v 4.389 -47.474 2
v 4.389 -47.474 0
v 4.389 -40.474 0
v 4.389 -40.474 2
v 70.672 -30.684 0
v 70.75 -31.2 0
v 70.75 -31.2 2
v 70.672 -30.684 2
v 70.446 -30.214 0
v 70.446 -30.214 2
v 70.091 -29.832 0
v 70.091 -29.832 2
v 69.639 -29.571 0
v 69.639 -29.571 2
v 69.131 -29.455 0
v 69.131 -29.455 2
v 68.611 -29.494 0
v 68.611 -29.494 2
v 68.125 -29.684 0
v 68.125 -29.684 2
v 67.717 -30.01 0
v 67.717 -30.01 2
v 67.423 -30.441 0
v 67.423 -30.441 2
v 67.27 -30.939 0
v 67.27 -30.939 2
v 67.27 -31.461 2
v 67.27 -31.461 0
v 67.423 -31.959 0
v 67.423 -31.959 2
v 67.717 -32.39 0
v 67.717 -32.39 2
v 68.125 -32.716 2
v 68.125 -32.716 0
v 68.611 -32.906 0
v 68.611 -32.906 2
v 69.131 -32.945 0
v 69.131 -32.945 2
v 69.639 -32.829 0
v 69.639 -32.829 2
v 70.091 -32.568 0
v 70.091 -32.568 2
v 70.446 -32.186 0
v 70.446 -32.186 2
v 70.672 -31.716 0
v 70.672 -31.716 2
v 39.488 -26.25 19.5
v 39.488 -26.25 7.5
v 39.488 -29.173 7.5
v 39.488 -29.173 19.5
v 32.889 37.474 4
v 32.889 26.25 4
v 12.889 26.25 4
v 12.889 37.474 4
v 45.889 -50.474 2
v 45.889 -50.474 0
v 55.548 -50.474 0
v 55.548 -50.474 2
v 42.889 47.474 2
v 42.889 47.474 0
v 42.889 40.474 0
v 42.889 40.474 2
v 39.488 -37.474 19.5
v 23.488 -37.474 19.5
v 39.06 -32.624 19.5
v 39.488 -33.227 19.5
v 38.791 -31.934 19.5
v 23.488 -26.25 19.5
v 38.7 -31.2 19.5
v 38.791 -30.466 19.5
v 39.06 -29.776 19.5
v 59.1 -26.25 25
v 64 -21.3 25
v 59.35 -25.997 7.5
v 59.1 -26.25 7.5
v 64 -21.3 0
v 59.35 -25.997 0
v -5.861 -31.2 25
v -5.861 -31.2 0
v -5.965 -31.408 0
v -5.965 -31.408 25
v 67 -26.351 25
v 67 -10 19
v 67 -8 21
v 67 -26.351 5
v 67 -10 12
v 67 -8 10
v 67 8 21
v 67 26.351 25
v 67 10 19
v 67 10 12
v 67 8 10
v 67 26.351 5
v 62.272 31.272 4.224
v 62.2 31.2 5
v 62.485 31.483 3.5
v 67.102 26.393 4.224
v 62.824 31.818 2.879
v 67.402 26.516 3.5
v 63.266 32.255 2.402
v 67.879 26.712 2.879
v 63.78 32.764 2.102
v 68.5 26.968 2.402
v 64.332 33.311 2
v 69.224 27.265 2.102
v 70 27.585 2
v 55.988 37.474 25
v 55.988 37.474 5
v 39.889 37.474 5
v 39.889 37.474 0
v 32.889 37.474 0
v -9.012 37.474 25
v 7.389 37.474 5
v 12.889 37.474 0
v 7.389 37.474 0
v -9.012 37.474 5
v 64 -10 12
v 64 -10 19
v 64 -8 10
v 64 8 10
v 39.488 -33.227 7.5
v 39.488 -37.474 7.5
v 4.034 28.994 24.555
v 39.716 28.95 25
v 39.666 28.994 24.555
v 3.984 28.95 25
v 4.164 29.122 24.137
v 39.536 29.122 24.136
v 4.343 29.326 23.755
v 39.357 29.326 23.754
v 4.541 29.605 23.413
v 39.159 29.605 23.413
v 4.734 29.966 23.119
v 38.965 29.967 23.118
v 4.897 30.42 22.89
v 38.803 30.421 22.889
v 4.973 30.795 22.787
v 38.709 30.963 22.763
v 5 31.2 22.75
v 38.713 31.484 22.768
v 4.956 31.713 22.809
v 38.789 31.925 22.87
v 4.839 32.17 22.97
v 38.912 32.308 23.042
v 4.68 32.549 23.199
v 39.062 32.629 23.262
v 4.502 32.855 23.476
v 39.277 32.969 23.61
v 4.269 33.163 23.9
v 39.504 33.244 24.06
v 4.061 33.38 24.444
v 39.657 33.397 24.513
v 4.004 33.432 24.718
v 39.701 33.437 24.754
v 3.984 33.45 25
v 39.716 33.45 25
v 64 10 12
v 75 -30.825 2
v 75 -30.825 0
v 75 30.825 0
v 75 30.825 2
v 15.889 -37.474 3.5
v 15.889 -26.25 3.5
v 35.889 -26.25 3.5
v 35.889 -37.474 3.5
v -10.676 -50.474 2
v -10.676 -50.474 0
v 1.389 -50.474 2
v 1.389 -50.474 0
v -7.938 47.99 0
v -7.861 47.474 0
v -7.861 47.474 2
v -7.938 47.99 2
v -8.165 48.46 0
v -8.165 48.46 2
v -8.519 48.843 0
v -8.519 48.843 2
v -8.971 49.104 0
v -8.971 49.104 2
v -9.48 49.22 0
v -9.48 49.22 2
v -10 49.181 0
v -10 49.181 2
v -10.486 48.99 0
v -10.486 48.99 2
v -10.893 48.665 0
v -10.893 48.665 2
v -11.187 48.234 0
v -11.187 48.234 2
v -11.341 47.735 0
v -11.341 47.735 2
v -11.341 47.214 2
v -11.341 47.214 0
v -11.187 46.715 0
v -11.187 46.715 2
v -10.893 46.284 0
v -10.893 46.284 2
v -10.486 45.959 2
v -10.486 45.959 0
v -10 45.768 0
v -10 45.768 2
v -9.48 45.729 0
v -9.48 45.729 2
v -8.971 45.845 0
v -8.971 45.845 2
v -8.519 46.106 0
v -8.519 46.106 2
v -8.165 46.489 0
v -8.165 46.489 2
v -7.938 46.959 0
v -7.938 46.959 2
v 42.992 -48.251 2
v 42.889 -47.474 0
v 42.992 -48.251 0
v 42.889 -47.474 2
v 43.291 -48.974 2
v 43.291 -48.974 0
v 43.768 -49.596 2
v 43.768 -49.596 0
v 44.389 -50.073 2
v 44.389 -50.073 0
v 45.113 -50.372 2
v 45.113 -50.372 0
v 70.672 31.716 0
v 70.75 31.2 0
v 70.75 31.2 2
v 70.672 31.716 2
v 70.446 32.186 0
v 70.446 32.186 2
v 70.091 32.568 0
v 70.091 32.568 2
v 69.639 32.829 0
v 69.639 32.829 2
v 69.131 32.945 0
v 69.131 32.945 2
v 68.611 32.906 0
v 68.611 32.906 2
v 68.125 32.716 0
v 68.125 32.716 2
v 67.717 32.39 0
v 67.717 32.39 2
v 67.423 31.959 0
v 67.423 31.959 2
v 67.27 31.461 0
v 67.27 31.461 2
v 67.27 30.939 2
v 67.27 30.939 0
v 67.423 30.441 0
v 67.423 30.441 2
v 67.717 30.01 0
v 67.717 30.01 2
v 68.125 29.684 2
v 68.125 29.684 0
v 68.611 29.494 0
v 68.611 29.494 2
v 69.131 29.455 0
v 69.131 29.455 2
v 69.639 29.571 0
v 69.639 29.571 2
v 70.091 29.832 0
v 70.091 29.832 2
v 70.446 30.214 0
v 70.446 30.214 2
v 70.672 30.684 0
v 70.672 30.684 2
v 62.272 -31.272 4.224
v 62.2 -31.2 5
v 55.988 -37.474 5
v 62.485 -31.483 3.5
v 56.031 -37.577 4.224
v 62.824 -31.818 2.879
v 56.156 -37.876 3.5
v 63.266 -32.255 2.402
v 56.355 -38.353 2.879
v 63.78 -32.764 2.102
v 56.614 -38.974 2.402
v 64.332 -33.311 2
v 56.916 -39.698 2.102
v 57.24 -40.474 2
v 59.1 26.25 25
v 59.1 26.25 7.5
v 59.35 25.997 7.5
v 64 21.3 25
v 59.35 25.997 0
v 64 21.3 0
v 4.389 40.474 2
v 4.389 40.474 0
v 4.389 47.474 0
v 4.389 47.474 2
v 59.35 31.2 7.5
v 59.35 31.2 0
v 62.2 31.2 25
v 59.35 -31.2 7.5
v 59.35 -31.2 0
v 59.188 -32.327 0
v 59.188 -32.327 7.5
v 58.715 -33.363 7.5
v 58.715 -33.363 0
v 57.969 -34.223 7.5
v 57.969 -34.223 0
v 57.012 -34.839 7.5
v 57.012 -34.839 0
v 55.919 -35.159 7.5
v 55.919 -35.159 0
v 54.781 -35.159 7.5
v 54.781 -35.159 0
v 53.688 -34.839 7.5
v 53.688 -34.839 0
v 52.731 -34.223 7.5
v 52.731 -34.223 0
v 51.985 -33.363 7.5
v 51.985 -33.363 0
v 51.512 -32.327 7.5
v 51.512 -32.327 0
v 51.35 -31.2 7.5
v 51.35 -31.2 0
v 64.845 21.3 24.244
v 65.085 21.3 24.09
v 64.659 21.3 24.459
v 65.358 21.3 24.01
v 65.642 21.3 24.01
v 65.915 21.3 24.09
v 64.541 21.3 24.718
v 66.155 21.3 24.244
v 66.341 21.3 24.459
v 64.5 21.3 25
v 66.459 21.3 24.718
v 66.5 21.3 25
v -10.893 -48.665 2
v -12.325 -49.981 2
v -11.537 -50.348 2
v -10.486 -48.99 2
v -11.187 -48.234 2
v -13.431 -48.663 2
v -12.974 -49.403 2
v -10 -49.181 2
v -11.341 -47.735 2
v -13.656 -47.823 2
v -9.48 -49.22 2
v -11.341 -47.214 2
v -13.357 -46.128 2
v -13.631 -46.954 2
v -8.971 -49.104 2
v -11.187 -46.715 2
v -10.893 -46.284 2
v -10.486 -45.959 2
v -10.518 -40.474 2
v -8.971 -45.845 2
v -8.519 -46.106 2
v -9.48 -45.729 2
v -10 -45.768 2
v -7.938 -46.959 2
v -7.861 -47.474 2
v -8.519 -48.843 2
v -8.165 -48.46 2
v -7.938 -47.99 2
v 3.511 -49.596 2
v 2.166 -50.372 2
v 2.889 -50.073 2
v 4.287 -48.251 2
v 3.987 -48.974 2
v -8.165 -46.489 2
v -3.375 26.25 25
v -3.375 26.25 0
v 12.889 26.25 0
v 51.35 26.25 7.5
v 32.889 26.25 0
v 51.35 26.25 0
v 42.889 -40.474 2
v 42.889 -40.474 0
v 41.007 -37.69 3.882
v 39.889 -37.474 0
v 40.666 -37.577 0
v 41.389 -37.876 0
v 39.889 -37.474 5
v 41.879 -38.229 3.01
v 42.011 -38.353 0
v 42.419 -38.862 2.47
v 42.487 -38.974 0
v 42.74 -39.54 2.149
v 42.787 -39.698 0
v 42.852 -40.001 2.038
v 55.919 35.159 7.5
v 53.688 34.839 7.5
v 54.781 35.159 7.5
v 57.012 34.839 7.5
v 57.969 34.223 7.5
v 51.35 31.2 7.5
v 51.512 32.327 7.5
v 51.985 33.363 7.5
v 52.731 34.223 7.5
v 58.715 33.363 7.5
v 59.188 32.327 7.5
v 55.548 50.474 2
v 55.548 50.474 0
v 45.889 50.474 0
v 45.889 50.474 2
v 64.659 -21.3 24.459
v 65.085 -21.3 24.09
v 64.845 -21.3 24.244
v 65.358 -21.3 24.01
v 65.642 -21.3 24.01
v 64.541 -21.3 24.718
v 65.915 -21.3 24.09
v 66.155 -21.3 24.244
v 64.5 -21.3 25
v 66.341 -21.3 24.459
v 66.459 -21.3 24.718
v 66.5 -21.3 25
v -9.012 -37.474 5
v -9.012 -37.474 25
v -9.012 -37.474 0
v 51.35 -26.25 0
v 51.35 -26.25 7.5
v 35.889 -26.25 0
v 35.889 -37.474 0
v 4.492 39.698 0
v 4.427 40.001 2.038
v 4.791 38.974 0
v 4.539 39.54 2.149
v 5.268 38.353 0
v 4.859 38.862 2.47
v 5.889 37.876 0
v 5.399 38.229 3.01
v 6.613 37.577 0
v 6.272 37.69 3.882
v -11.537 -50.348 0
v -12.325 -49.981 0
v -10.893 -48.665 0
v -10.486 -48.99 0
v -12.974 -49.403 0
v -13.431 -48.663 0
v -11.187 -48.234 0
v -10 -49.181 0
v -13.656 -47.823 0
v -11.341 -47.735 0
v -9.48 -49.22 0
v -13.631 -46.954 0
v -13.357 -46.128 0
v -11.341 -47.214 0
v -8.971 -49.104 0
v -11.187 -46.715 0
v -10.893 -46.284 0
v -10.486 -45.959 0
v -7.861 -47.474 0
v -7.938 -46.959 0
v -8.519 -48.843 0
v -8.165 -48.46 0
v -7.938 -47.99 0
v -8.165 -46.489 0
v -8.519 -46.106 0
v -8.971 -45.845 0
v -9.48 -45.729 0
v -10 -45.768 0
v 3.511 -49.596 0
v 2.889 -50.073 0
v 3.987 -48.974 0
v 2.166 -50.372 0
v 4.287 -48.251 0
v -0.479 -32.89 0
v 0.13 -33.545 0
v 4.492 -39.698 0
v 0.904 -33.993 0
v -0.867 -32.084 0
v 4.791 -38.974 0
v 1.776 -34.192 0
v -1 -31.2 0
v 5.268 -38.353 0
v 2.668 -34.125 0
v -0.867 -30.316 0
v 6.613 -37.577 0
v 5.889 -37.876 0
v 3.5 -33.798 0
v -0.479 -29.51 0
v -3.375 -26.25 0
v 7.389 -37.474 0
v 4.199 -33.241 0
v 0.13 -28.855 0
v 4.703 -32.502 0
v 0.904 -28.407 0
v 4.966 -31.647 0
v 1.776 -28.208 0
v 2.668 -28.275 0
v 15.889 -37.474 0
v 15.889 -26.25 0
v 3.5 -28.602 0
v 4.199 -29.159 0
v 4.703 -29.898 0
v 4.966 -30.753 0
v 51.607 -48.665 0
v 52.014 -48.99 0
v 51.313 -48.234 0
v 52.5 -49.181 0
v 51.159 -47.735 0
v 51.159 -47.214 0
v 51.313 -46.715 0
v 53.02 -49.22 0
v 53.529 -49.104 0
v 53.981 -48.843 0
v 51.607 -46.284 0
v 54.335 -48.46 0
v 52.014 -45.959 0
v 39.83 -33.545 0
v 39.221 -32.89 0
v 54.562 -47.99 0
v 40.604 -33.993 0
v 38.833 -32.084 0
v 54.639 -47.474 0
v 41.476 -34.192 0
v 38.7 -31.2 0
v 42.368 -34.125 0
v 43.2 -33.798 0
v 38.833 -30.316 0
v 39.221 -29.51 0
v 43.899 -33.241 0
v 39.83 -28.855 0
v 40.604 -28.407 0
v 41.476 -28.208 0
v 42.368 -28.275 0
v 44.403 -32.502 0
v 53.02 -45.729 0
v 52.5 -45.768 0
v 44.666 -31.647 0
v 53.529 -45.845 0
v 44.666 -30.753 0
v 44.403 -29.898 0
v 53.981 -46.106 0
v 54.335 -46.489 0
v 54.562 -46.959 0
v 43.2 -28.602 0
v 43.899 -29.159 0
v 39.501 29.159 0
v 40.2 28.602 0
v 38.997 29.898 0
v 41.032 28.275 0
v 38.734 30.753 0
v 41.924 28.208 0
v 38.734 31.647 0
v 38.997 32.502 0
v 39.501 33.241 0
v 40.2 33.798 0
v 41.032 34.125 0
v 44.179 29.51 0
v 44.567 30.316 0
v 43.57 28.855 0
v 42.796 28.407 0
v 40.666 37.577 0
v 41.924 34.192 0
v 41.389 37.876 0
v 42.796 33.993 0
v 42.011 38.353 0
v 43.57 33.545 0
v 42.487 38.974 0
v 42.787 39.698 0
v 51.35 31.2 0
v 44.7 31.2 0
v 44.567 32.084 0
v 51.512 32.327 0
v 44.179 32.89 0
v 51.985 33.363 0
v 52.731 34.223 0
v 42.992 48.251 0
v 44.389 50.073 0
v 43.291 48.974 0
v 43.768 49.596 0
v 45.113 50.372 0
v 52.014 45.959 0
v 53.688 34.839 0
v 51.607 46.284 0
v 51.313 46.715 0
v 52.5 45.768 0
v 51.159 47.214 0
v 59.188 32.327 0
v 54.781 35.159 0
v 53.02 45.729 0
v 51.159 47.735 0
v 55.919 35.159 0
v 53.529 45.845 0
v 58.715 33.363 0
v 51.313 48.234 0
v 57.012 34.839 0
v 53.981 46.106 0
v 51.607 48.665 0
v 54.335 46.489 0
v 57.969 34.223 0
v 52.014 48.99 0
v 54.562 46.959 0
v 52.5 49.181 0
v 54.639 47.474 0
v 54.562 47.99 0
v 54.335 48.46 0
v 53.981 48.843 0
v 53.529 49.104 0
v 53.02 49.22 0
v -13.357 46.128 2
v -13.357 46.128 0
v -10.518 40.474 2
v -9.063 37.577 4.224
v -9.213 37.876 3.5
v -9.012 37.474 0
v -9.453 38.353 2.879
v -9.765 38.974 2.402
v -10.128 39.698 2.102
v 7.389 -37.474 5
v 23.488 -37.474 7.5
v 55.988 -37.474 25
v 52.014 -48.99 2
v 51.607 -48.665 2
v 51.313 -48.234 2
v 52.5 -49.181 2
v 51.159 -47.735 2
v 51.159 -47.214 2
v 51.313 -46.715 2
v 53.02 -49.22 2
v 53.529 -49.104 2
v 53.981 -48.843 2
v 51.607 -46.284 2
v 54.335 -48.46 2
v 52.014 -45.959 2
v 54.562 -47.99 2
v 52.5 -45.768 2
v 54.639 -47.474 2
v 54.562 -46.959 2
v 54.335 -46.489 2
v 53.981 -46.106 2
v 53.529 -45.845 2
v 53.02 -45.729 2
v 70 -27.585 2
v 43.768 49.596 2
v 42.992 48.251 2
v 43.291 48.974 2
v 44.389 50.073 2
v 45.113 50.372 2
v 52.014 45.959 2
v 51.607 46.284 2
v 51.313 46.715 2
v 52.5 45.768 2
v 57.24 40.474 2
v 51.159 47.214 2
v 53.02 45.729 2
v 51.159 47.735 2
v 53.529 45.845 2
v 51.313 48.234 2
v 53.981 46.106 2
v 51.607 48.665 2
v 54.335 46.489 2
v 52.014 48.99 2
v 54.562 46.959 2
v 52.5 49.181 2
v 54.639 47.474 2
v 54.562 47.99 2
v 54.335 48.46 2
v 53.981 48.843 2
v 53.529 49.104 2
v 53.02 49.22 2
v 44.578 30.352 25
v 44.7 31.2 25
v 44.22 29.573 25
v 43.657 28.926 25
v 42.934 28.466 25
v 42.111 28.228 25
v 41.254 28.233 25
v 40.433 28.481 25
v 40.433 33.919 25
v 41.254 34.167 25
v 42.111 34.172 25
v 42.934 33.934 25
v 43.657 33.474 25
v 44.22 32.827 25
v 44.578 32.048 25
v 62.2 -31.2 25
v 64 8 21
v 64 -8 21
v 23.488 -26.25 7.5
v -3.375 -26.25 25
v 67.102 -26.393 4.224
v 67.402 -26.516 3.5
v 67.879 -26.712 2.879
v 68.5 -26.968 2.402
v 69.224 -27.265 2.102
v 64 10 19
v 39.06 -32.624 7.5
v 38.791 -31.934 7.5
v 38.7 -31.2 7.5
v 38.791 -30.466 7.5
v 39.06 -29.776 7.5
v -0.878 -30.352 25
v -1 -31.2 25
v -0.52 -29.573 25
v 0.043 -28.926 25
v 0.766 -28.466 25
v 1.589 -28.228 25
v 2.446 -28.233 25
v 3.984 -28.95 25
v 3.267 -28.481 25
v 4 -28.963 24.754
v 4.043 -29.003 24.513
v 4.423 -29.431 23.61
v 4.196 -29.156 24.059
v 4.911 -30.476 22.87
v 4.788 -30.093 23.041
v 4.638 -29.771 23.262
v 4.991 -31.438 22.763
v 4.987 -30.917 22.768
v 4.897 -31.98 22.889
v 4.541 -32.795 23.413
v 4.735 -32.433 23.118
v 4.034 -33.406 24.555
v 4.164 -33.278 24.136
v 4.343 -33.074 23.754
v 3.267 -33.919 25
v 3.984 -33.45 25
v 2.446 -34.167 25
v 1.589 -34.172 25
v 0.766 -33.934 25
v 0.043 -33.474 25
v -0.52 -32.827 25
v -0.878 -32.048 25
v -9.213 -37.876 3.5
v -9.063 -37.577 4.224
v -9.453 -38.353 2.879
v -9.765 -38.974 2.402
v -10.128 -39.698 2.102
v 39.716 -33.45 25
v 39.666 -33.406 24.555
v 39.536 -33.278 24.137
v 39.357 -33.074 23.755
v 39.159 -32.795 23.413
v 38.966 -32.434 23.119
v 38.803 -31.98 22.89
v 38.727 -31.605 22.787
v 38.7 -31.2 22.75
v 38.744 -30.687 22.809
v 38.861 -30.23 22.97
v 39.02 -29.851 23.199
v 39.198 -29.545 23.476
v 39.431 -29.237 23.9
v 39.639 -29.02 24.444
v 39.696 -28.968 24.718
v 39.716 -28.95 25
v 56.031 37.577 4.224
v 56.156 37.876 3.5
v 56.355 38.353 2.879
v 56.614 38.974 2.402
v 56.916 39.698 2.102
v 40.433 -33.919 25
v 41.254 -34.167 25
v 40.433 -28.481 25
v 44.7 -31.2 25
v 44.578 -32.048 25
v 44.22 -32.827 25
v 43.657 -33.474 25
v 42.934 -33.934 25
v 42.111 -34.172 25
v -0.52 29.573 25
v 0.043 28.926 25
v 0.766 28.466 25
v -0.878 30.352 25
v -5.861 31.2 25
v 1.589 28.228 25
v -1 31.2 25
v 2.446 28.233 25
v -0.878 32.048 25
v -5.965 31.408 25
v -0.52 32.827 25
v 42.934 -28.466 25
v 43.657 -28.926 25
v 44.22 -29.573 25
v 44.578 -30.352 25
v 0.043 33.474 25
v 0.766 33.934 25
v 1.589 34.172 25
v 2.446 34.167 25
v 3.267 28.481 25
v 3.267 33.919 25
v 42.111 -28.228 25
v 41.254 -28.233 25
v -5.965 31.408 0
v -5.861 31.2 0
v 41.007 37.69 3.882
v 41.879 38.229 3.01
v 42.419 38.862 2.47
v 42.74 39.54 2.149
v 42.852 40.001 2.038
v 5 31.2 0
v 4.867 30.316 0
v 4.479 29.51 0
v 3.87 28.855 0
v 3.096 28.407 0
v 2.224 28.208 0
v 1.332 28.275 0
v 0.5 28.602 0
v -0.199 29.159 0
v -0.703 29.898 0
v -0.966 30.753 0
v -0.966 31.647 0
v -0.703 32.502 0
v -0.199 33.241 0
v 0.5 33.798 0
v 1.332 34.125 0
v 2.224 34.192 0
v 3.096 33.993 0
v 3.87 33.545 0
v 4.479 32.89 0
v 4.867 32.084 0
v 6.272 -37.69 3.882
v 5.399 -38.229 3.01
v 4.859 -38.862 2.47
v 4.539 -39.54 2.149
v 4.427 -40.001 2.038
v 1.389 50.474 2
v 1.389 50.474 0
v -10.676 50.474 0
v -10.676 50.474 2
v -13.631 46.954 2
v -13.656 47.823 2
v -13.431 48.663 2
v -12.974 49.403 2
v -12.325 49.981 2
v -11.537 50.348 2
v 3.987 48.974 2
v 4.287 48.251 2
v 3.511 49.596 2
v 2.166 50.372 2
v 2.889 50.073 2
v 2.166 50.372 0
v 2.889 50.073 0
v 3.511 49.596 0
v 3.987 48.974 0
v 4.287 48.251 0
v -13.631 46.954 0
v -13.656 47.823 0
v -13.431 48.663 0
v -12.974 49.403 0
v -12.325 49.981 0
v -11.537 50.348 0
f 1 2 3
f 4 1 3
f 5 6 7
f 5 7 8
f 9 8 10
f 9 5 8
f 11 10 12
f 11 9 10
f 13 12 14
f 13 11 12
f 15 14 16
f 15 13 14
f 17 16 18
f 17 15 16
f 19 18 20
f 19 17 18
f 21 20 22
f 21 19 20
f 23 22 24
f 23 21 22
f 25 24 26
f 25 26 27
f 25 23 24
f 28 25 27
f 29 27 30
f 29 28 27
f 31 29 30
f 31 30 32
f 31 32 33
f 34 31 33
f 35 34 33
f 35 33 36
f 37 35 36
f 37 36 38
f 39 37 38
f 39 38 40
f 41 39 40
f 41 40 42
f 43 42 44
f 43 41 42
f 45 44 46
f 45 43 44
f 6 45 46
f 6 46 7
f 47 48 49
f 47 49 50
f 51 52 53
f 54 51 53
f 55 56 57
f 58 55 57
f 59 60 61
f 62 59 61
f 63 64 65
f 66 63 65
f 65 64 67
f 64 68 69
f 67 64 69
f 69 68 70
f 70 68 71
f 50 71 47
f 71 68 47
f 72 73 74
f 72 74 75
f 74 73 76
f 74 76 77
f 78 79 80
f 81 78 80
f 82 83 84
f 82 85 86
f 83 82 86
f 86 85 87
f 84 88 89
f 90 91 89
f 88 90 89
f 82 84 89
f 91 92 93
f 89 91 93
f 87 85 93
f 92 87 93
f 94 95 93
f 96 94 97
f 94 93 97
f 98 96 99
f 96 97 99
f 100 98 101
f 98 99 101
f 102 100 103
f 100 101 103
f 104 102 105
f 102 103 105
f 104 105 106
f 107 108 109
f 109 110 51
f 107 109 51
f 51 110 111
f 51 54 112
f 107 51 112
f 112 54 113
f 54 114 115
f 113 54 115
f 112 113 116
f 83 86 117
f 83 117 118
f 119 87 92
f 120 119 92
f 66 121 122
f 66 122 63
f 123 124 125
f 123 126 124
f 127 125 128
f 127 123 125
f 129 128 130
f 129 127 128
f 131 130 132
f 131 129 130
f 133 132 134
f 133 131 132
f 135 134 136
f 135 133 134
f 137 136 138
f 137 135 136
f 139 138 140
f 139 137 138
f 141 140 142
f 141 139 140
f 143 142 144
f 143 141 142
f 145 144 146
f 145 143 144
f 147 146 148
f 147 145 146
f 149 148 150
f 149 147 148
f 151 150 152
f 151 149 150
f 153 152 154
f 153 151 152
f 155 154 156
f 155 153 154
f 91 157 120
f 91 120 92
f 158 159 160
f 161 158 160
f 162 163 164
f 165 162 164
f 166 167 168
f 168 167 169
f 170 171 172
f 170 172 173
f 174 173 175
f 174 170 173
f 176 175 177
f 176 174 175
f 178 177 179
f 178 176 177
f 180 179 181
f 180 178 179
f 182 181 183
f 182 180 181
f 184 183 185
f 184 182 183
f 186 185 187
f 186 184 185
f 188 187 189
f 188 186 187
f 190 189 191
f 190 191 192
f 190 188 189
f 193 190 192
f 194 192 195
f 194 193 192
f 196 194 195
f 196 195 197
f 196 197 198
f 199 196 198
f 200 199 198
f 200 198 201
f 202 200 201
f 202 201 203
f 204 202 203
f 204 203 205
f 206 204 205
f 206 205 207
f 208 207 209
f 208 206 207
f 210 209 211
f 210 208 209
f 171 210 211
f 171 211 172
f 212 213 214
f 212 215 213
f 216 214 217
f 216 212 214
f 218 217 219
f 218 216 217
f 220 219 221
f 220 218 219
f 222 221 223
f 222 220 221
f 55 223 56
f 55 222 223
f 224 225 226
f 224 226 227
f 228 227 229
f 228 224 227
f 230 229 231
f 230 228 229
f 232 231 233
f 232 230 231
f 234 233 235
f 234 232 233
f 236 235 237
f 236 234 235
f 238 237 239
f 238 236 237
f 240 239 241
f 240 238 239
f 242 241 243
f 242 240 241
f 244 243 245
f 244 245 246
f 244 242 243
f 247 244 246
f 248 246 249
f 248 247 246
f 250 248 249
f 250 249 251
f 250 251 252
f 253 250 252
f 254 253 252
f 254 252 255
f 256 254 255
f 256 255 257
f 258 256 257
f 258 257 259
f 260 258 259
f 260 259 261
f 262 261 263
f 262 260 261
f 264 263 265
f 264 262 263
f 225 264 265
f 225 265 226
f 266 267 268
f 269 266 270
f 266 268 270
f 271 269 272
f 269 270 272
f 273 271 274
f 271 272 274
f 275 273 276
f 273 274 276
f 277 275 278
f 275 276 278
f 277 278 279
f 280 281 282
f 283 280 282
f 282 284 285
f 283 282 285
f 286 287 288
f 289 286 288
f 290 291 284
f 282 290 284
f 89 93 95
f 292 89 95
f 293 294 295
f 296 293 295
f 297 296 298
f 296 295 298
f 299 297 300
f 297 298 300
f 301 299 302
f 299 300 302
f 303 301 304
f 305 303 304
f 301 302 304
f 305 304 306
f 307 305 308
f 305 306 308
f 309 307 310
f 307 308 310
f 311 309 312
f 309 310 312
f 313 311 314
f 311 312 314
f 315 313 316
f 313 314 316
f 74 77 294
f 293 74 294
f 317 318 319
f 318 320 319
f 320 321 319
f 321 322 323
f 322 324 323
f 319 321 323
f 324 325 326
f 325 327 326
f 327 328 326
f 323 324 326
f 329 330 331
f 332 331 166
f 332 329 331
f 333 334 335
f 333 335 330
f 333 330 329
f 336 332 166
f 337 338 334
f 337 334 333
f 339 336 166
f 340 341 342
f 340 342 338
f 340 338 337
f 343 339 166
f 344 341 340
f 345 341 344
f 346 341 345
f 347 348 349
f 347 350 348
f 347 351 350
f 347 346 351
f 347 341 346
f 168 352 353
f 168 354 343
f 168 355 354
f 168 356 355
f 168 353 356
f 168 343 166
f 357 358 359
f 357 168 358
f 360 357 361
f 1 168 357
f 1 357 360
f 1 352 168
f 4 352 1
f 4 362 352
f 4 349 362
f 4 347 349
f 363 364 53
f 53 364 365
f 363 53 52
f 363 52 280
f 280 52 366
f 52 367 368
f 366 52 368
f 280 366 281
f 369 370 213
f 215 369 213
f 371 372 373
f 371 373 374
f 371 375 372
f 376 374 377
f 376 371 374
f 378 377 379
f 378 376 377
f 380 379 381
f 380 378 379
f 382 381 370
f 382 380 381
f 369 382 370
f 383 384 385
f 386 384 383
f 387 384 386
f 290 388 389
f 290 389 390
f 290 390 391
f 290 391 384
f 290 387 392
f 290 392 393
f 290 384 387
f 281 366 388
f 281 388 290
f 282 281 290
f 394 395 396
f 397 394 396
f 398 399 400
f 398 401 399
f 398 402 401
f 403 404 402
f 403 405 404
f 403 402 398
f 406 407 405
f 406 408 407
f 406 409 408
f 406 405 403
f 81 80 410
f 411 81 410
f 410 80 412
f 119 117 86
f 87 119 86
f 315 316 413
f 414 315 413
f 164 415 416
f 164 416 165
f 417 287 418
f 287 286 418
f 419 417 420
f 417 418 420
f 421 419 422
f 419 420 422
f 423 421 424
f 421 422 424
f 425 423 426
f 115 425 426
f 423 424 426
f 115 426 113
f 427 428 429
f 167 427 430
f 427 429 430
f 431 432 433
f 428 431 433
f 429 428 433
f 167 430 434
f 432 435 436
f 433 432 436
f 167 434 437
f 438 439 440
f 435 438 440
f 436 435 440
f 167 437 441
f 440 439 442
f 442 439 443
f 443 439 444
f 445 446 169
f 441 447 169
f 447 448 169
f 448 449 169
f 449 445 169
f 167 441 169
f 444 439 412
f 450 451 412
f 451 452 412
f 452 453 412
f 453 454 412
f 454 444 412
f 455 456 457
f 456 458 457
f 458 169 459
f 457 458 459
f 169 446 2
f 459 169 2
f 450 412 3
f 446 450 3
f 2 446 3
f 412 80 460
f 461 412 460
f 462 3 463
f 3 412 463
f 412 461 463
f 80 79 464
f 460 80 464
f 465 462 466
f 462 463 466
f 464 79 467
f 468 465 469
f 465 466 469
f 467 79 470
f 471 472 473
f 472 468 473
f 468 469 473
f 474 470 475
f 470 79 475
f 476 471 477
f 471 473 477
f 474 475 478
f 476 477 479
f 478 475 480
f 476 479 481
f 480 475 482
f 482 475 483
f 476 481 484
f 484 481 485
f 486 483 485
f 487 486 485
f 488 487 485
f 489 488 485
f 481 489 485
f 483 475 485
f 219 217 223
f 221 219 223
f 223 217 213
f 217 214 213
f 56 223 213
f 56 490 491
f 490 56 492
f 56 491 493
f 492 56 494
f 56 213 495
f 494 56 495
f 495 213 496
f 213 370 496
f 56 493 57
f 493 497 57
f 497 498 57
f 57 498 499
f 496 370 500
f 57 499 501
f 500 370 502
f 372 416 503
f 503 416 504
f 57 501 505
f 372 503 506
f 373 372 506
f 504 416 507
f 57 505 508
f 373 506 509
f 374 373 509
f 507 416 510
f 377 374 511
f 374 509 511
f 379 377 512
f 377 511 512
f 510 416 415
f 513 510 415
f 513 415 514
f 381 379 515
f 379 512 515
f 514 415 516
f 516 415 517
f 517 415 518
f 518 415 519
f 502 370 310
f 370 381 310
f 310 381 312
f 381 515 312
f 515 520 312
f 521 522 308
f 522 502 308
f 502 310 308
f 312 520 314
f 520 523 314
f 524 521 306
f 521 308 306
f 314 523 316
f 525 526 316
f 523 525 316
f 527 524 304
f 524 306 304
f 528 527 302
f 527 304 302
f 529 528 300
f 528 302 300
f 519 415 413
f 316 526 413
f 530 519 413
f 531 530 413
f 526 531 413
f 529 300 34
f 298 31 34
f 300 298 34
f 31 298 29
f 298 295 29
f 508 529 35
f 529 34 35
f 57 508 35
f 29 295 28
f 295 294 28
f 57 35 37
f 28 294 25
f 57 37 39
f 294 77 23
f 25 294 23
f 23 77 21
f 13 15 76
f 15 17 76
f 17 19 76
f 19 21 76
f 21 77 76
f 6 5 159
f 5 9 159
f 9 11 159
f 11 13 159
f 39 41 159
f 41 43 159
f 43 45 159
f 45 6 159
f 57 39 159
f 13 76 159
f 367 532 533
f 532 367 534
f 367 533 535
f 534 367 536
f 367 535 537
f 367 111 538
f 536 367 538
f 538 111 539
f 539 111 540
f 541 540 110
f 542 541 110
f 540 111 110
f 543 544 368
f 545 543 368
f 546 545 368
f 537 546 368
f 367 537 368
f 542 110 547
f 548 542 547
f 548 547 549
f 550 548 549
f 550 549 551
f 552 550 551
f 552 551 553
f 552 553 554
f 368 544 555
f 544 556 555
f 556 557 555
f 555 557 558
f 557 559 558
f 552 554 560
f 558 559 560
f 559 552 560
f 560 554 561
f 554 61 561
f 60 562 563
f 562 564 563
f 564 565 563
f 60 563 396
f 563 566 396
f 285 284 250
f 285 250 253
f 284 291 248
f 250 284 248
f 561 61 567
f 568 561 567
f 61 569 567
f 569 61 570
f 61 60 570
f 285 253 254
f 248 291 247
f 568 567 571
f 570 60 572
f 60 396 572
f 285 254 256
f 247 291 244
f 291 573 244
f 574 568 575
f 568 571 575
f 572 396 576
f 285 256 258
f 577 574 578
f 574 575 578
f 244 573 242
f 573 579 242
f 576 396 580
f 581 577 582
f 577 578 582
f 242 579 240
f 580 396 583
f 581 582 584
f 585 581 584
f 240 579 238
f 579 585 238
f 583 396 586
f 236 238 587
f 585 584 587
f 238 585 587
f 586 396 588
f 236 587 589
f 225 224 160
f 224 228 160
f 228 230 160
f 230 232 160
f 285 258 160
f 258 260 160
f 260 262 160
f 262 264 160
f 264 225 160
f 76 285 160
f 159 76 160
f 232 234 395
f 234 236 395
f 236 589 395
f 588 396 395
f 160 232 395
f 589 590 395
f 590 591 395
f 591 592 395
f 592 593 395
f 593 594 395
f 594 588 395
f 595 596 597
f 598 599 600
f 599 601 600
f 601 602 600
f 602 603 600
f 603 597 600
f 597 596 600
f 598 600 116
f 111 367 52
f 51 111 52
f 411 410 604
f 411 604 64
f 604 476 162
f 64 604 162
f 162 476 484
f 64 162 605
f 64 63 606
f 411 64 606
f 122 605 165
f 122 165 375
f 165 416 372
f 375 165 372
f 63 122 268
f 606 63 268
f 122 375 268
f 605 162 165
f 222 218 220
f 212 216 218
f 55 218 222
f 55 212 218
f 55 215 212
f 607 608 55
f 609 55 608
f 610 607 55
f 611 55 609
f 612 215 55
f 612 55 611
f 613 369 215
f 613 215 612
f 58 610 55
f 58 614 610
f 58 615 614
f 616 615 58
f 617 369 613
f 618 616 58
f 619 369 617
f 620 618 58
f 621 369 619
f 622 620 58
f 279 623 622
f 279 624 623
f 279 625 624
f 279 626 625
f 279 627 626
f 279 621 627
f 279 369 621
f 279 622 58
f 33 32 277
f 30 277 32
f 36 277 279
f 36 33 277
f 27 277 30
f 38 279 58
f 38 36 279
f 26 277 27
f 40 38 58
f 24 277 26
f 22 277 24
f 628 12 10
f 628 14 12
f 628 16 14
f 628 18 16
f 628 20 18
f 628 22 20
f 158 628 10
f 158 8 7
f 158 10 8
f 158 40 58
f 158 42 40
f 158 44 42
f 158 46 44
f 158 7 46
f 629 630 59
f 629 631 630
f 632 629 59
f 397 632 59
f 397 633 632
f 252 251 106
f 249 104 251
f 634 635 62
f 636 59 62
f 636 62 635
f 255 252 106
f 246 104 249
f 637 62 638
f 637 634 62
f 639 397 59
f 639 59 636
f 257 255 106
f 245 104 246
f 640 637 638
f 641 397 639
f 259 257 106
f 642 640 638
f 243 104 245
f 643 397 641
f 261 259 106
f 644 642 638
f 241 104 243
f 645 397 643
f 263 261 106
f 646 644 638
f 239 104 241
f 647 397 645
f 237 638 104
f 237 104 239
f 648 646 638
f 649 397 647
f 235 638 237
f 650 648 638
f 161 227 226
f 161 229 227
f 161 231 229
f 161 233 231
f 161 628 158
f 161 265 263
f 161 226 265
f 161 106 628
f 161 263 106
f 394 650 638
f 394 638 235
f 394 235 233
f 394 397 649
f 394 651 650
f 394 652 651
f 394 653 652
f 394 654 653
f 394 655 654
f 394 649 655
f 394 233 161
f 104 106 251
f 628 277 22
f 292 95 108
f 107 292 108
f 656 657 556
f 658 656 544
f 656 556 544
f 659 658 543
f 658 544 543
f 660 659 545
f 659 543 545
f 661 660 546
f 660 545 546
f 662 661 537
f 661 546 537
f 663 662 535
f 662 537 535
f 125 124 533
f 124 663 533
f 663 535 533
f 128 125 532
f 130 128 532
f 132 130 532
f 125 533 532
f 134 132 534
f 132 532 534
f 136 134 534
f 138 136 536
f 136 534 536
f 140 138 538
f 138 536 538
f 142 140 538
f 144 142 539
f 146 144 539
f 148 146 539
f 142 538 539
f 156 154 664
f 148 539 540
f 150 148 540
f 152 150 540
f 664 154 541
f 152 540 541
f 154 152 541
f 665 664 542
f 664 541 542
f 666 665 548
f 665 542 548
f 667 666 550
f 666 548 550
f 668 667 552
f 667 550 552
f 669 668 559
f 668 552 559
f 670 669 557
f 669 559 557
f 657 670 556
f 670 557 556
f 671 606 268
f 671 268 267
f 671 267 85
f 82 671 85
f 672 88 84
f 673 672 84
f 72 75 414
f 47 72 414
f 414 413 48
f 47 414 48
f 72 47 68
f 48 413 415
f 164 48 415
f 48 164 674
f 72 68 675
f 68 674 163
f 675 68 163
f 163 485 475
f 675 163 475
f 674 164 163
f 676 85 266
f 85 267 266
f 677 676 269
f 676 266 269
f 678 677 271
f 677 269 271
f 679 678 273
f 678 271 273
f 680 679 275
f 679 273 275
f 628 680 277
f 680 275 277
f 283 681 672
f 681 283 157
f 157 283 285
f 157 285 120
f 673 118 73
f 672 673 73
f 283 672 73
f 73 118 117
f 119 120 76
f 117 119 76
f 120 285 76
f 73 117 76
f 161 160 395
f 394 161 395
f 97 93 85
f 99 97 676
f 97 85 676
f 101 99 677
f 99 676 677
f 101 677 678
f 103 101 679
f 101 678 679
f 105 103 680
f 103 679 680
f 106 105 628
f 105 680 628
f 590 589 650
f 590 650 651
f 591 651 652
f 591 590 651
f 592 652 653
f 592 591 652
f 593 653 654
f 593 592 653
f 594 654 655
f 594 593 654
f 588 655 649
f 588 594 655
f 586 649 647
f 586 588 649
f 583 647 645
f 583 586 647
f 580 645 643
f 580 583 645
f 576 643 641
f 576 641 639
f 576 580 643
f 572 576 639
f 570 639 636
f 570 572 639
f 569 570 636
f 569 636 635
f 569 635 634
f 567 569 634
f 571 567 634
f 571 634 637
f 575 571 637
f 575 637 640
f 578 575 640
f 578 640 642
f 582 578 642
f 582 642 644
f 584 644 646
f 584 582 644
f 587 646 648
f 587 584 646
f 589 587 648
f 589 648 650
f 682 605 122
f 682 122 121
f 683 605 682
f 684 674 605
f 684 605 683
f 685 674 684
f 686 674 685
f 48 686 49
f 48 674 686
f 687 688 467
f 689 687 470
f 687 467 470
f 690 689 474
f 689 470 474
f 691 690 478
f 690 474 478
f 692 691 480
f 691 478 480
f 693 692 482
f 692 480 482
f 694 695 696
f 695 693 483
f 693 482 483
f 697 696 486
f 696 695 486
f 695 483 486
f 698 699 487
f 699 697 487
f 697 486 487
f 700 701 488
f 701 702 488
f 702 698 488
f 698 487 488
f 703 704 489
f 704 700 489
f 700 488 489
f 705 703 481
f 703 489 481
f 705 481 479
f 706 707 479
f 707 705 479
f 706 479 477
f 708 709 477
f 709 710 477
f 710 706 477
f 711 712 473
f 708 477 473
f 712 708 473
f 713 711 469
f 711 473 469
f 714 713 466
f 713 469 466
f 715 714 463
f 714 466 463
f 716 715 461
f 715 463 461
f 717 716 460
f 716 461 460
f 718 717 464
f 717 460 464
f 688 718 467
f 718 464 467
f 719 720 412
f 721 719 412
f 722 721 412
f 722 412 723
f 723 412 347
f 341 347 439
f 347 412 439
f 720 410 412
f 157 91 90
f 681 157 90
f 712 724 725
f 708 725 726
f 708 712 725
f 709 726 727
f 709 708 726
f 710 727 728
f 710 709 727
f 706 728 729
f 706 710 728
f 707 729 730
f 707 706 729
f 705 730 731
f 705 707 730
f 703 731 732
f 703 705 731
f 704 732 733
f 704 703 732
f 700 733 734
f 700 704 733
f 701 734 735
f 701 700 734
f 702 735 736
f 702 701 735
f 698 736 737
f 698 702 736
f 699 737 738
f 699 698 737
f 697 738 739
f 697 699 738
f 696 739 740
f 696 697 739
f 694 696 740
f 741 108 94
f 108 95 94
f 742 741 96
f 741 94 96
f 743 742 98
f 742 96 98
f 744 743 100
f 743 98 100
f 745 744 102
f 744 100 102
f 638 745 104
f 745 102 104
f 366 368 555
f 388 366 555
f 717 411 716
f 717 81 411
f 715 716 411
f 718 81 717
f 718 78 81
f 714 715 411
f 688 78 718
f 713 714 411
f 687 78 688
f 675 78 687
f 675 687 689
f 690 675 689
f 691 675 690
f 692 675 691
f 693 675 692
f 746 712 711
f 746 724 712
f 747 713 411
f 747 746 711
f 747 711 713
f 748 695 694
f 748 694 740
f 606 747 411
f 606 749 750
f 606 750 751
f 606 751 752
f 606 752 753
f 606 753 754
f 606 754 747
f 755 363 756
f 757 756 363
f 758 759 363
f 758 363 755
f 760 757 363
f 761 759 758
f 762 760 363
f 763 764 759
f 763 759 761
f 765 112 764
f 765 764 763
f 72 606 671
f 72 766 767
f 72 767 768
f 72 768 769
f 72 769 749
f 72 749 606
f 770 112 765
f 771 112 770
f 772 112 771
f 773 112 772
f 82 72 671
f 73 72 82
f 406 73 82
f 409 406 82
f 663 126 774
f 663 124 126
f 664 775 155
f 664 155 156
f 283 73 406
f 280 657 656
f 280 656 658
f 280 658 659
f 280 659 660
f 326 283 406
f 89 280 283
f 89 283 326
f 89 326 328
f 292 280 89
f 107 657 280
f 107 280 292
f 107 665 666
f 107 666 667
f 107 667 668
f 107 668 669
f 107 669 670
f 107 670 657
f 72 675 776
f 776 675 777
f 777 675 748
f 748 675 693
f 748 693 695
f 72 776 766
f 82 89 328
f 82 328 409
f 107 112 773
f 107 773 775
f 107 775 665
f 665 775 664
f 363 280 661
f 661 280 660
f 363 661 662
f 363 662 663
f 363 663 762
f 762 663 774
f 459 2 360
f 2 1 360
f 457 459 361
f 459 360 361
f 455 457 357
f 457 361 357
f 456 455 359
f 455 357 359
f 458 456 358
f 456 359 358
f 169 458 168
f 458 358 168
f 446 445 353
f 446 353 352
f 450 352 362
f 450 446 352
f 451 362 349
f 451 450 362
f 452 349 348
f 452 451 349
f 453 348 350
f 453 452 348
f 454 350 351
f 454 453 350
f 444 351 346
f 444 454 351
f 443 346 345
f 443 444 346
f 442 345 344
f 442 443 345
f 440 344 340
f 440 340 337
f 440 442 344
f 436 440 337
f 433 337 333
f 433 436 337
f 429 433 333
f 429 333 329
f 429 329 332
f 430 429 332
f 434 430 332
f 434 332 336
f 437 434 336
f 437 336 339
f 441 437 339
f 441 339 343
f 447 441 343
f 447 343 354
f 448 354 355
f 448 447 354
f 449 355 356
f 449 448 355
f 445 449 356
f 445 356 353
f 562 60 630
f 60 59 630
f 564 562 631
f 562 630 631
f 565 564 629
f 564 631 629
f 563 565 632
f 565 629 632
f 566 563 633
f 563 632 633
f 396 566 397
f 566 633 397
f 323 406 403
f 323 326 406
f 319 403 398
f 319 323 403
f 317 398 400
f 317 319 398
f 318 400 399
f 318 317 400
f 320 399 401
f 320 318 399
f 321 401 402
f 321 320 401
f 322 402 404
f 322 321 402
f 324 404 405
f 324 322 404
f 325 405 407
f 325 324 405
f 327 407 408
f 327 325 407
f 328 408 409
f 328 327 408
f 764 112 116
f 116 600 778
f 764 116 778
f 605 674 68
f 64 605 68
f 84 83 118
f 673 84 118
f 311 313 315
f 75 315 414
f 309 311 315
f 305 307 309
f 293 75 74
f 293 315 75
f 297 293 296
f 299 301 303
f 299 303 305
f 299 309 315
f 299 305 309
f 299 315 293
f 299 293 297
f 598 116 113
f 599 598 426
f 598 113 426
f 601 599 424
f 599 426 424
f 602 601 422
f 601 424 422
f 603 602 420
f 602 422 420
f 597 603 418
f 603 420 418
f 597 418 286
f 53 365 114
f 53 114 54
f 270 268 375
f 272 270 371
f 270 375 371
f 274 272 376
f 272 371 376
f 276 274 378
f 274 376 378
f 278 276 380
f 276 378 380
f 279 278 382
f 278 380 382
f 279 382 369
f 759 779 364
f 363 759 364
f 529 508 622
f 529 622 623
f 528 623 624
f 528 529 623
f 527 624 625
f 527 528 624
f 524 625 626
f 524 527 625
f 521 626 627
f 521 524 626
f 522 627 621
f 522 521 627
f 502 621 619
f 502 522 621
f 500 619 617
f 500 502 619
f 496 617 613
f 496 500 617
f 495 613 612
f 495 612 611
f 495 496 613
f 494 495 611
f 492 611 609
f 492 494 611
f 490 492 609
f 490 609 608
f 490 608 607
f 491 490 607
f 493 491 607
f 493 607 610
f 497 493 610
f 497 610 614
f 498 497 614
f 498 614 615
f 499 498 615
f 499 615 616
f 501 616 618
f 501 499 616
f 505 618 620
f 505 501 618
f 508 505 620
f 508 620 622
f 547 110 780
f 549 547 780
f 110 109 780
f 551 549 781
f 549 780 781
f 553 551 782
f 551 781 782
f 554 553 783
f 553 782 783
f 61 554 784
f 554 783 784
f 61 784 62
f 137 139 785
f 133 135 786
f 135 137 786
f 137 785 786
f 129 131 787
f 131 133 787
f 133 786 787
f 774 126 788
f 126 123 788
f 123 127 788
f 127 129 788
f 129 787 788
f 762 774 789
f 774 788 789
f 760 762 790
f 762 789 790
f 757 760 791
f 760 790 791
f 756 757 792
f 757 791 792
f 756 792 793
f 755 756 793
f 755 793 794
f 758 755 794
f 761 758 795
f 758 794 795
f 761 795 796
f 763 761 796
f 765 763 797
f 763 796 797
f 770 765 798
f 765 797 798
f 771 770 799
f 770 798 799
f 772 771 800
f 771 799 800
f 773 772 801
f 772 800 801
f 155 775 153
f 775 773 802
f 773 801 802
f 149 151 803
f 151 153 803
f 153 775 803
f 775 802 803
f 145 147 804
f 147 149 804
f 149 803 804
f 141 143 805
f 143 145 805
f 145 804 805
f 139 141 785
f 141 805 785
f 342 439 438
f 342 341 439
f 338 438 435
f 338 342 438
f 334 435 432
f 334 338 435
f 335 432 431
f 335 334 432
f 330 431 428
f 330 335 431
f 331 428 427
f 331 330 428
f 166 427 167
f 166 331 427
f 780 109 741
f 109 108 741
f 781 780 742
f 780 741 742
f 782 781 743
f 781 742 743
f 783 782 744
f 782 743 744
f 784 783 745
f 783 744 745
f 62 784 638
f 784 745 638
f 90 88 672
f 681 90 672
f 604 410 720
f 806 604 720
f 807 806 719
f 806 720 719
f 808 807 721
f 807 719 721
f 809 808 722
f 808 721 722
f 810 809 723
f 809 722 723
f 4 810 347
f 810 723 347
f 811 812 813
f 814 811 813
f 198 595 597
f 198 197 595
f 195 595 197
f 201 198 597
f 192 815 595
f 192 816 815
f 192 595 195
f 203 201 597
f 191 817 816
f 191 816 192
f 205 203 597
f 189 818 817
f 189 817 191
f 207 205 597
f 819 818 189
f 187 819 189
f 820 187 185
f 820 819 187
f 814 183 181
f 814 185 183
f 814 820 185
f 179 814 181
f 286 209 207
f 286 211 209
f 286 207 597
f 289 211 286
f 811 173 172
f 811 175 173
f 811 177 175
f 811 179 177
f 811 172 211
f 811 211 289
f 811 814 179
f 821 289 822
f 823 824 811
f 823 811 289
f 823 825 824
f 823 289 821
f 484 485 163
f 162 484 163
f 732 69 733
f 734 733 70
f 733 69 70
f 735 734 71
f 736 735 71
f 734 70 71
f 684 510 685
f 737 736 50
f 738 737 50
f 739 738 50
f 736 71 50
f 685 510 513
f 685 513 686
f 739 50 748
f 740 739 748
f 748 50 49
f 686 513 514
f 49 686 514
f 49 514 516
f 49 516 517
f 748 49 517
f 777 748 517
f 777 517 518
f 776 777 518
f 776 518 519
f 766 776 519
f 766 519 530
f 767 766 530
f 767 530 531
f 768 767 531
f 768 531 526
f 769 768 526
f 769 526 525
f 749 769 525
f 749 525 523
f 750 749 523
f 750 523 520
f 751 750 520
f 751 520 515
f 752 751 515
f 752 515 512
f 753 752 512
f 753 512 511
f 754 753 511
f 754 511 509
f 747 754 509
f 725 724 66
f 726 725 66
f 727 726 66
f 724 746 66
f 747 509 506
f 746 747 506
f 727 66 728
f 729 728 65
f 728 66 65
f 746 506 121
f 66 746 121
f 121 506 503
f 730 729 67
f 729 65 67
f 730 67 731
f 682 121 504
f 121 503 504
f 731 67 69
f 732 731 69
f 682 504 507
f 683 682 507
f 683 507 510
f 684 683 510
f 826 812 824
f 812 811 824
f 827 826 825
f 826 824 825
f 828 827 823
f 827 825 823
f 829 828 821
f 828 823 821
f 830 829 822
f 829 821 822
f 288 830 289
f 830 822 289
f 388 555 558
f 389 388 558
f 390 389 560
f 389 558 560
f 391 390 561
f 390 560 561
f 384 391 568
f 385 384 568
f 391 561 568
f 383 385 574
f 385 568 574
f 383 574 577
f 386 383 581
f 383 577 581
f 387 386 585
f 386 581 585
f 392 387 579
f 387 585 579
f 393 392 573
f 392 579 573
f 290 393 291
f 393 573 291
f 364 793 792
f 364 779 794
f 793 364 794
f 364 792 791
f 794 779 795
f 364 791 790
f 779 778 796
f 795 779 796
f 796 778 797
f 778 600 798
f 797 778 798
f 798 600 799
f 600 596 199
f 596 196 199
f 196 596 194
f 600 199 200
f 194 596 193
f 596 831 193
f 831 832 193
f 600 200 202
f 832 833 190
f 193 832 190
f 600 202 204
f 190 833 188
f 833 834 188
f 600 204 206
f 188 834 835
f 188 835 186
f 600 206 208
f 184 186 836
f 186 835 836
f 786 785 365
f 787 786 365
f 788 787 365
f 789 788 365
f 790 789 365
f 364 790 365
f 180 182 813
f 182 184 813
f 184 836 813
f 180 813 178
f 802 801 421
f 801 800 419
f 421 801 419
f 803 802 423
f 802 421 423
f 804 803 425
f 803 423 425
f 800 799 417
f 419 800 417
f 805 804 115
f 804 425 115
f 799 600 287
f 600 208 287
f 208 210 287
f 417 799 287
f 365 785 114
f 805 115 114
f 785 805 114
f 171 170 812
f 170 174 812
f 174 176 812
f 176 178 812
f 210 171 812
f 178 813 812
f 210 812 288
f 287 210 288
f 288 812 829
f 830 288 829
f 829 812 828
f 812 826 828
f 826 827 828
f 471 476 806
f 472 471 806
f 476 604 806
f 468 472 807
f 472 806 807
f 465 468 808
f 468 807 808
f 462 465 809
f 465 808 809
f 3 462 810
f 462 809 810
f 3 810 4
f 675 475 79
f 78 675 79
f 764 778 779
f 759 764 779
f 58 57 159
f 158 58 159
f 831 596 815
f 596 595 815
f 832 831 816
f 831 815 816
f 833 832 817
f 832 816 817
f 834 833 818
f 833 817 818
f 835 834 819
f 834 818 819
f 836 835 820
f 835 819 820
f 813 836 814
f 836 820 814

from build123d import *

# Parameters (mm, degrees)
F0_R      = 1.75
F1_DEPTH  = 2
F2_DEPTH  = 25
F3_W      = 10
F3_H      = 11
F4_DEPTH  = 12.5
F5_W      = 16
F5_H      = 12
F5_W_2    = 9.587623179
F5_H_2    = 49.3407100439
F5_W_3    = 20
F5_H_3    = 3.5
F6_W      = 20
F6_H      = 4
F7_DEPTH  = 12.5
F8_R      = 3
F10_DEPTH = 7.5
F11_W     = 1
F11_H     = 42.6
F15_SIZE  = 2


# Not quite as in the source:
# - a feature names something its author has since deleted; it is built from what else it names


with BuildPart() as f1:
    # F0 (on Top) → F1 (new body)
    with BuildSketch(Plane.XY):
        Polygon((-15.5396774872, 50.4744988004), (-9.0115841546, 37.4744988004), (4.3894230769, 37.4744988004), (4.3894230769, 50.4744988004), align=None)
        with Locations((-9.6105769231, 47.4744988004)):
            Circle(F0_R, mode=Mode.SUBTRACT)
    extrude(amount=F1_DEPTH)



with BuildPart() as f1b:
    # F0 (on Top) → F1, piece 2 (new body)
    with BuildSketch(Plane.XY):
        Polygon((55.9884158454, 37.4744988004), (62.1997159179, 31.2), (67, 26.3508739936), (67, -26.3508739936), (62.1997159179, -31.2), (55.9884158454, -37.4744988004), (42.8894230769, -37.4744988004), (42.8894230769, -50.4744988004), (55.5480775622, -50.4744988004), (75, -30.8246569672), (75, 30.8246569672), (55.5480775622, 50.4744988004), (42.8894230769, 50.4744988004), (42.8894230769, 37.4744988004), align=None)
        with Locations((52.8894230769, -47.4744988004)):
            Circle(F0_R, mode=Mode.SUBTRACT)
        with Locations((69, -31.2)):
            Circle(F0_R, mode=Mode.SUBTRACT)
        with Locations((69, 31.2)):
            Circle(F0_R, mode=Mode.SUBTRACT)
        with Locations((52.8894230769, 47.4744988004)):
            Circle(F0_R, mode=Mode.SUBTRACT)
    extrude(amount=F1_DEPTH)


with BuildPart() as f1c:
    # F0 (on Top) → F1, piece 3 (new body)
    with BuildSketch(Plane.XY):
        Polygon((4.3894230769, -50.4744988004), (4.3894230769, -37.4744988004), (-9.0115841546, -37.4744988004), (-15.5396774872, -50.4744988004), align=None)
        with Locations((-9.6105769231, -47.4744988004)):
            Circle(F0_R, mode=Mode.SUBTRACT)
    extrude(amount=F1_DEPTH)


with BuildPart() as f1_1:
    add(f1.part)

    add(f1b.part)  # F2 merges F1b

    add(f1c.part)  # F2 merges F1c
    # F0 (on Top) → F2 (join)
    with BuildSketch(Plane.XY):
        with BuildLine():
            ThreePointArc((-1, 31.2), (2, 34.2), (5, 31.2))
            Line((5, 31.2), (38.7, 31.2))
            ThreePointArc((38.7, 31.2), (41.7, 34.2), (44.7, 31.2))
            Line((44.7, 31.2), (54.1997159179, 31.2))
            Line((54.1997159179, 31.2), (62.1997159179, 31.2))
            Line((62.1997159179, 31.2), (55.9884158454, 37.4744988004))
            Line((55.9884158454, 37.4744988004), (42.8894230769, 37.4744988004))
            Line((42.8894230769, 37.4744988004), (4.3894230769, 37.4744988004))
            Line((4.3894230769, 37.4744988004), (-9.0115841546, 37.4744988004))
            Line((-9.0115841546, 37.4744988004), (-5.9652768733, 31.4081035087))
            Line((-5.9652768733, 31.4081035087), (-5.8607754019, 31.2))
            Line((-5.8607754019, 31.2), (-1, 31.2))
        make_face()
        with BuildLine():
            Line((55.9884158454, -37.4744988004), (62.1997159179, -31.2))
            Line((62.1997159179, -31.2), (54.1997159179, -31.2))
            Line((54.1997159179, -31.2), (44.7, -31.2))
            ThreePointArc((44.7, -31.2), (41.7, -34.2), (38.7, -31.2))
            Line((38.7, -31.2), (5, -31.2))
            ThreePointArc((5, -31.2), (2, -34.2), (-1, -31.2))
            Line((-1, -31.2), (-5.8607754019, -31.2))
            Line((-5.8607754019, -31.2), (-5.9652768733, -31.4081035087))
            Line((-5.9652768733, -31.4081035087), (-9.0115841546, -37.4744988004))
            Line((-9.0115841546, -37.4744988004), (4.3894230769, -37.4744988004))
            Line((4.3894230769, -37.4744988004), (42.8894230769, -37.4744988004))
            Line((42.8894230769, -37.4744988004), (55.9884158454, -37.4744988004))
        make_face()
        Polygon((62.1997159179, 31.2), (54.1997159179, 31.2), (59.0998579589, 26.25), (64, 21.3), (64, -21.3), (59.0998579589, -26.25), (54.1997159179, -31.2), (62.1997159179, -31.2), (67, -26.3508739936), (67, 26.3508739936), align=None)
        with BuildLine():
            Line((38.7, 31.2), (5, 31.2))
            ThreePointArc((5, 31.2), (2, 28.2), (-1, 31.2))
            Line((-1, 31.2), (-5.8607754019, 31.2))
            Line((-5.8607754019, 31.2), (-3.3750783253, 26.25))
            Line((-3.3750783253, 26.25), (59.0998579589, 26.25))
            Line((59.0998579589, 26.25), (54.1997159179, 31.2))
            Line((54.1997159179, 31.2), (44.7, 31.2))
            ThreePointArc((44.7, 31.2), (41.7, 28.2), (38.7, 31.2))
        make_face()
        with BuildLine():
            Line((54.1997159179, -31.2), (59.0998579589, -26.25))
            Line((59.0998579589, -26.25), (-3.3750783253, -26.25))
            Line((-3.3750783253, -26.25), (-5.8607754019, -31.2))
            Line((-5.8607754019, -31.2), (-1, -31.2))
            ThreePointArc((-1, -31.2), (2, -28.2), (5, -31.2))
            Line((5, -31.2), (38.7, -31.2))
            ThreePointArc((38.7, -31.2), (41.7, -28.2), (44.7, -31.2))
            Line((44.7, -31.2), (54.1997159179, -31.2))
        make_face()
    extrude(amount=F2_DEPTH)

    # F3 (on face) → F4 (cut, symmetric)
    with BuildSketch(Plane.YZ.offset(67)):
        with Locations((-5, 15.5)):
            Rectangle(F3_W, F3_H)
        with Locations((5, 15.5)):
            Rectangle(F3_W, F3_H)
    extrude(amount=F4_DEPTH, both=True, mode=Mode.SUBTRACT)

    # F5 (on face) + F6 (on face) → F7 (cut, symmetric)
    with BuildSketch(Plane.XZ.offset(37.4744988004)):
        with Locations((31.4884158454, 13.5)):
            Rectangle(F5_W, F5_H)
        with Locations((88.4978957474, 268.2395651937)):
            Rectangle(F5_W_2, F5_H_2)
        with Locations((25.8894230769, 1.75)):
            Rectangle(F5_W_3, F5_H_3)
    with BuildSketch(Plane(origin=(0, 37.4744988004, 0), x_dir=(-1, 0, 0), z_dir=(0, 1, 0))):
        with Locations((-22.8894230769, 2)):
            Rectangle(F6_W, F6_H)
    extrude(amount=F7_DEPTH, both=True, dir=(0, -1, 0), mode=Mode.SUBTRACT)

    # F8
    f8_edges = [f1_1.edges().sort_by_distance(p)[0] for p in [
        (49.438919, 37.474499, 2),
        (-2.311081, 37.474499, 2),
        (61.494208, 31.912686, 2),
        (67, 0, 2),
        (61.494208, -31.912686, 2),
        (49.438919, -37.474499, 2),
        (-2.311081, -37.474499, 2),
        (4.389423, 37.474499, 1),
        (42.889423, 37.474499, 1),
        (4.389423, -37.474499, 1),
        (42.889423, -37.474499, 1),
        (-15.539677, 50.474499, 1),
        (-15.539677, -50.474499, 1),
        (42.889423, 50.474499, 1),
        (4.389423, 50.474499, 1),
        (42.889423, -50.474499, 1),
        (4.389423, -50.474499, 1),
    ]]
    fillet(f8_edges, radius=F8_R)

    # F9 (on face) → F10 (cut)
    with BuildSketch(Plane(origin=(0, 0, 0), x_dir=(1, 0, 0), z_dir=(0, 0, -1))):
        with BuildLine():
            ThreePointArc((51.35, 31.2), (55.35, 27.2), (59.35, 31.2))
            ThreePointArc((59.35, 31.2), (55.35, 35.2), (51.35, 31.2))
        make_face()
        with BuildLine():
            Line((59.35, 26.25), (59.35, 31.2))
            ThreePointArc((59.35, 31.2), (55.35, 27.2), (51.35, 31.2))
            Line((51.35, 31.2), (51.35, 26.25))
            Line((51.35, 26.25), (59.0998579589, 26.25))
            Line((59.0998579589, 26.25), (59.35, 26.25))
        make_face()
        Polygon((59.35, 25.997312814), (59.35, 26.25), (59.0998579589, 26.25), align=None)
        with BuildLine():
            ThreePointArc((51.35, -31.2), (55.35, -35.2), (59.35, -31.2))
            ThreePointArc((59.35, -31.2), (55.35, -27.2), (51.35, -31.2))
        make_face()
        with BuildLine():
            ThreePointArc((51.35, -31.2), (55.35, -27.2), (59.35, -31.2))
            Line((59.35, -31.2), (59.35, -26.25))
            Line((59.35, -26.25), (59.0998579589, -26.25))
            Line((59.0998579589, -26.25), (51.35, -26.25))
            Line((51.35, -26.25), (51.35, -31.2))
        make_face()
        Polygon((59.0998579589, -26.25), (59.35, -26.25), (59.35, -25.997312814), align=None)
    extrude(amount=-F10_DEPTH, mode=Mode.SUBTRACT)

    # F11 (on face) → F12 (revolve, cut)
    with BuildSketch(Plane.XY.offset(25)):
        with Locations((66, 0)):
            Rectangle(F11_W, F11_H)
    revolve(axis=Axis((65.5, 0, 25), (0, -1, 0)), mode=Mode.SUBTRACT)

    # F11 (on face) → F13 (revolve, cut)
    with BuildSketch(Plane.XY.offset(25)):
        with BuildLine():
            ThreePointArc((3.9843134833, 33.45), (4.7343134833, 32.4343134833), (5, 31.2))
            Line((5, 31.2), (38.7, 31.2))
            ThreePointArc((38.7, 31.2), (38.9656865167, 32.4343134833), (39.7156865167, 33.45))
            Line((39.7156865167, 33.45), (3.9843134833, 33.45))
        make_face()
    revolve(axis=Axis((21.85, 31.2, 25), (1, 0, 0)), mode=Mode.SUBTRACT)

    # F11 (on face) → F14 (revolve, cut)
    with BuildSketch(Plane.XY.offset(25)):
        with BuildLine():
            Line((5, -31.2), (38.7, -31.2))
            ThreePointArc((38.7, -31.2), (38.9656865167, -29.9656865167), (39.7156865167, -28.95))
            Line((39.7156865167, -28.95), (3.9843134833, -28.95))
            ThreePointArc((3.9843134833, -28.95), (4.7343134833, -29.9656865167), (5, -31.2))
        make_face()
    revolve(axis=Axis((21.85, -31.2, 25), (1, 0, 0)), mode=Mode.SUBTRACT)

    # F15
    f15_edges = [f1_1.edges().sort_by_distance(p)[0] for p in [
        (65.5, -10, 21),
        (65.5, 10, 21),
        (65.5, -10, 10),
        (65.5, 10, 10),
    ]]
    chamfer(f15_edges, length=F15_SIZE)


solid = f1_1.part
